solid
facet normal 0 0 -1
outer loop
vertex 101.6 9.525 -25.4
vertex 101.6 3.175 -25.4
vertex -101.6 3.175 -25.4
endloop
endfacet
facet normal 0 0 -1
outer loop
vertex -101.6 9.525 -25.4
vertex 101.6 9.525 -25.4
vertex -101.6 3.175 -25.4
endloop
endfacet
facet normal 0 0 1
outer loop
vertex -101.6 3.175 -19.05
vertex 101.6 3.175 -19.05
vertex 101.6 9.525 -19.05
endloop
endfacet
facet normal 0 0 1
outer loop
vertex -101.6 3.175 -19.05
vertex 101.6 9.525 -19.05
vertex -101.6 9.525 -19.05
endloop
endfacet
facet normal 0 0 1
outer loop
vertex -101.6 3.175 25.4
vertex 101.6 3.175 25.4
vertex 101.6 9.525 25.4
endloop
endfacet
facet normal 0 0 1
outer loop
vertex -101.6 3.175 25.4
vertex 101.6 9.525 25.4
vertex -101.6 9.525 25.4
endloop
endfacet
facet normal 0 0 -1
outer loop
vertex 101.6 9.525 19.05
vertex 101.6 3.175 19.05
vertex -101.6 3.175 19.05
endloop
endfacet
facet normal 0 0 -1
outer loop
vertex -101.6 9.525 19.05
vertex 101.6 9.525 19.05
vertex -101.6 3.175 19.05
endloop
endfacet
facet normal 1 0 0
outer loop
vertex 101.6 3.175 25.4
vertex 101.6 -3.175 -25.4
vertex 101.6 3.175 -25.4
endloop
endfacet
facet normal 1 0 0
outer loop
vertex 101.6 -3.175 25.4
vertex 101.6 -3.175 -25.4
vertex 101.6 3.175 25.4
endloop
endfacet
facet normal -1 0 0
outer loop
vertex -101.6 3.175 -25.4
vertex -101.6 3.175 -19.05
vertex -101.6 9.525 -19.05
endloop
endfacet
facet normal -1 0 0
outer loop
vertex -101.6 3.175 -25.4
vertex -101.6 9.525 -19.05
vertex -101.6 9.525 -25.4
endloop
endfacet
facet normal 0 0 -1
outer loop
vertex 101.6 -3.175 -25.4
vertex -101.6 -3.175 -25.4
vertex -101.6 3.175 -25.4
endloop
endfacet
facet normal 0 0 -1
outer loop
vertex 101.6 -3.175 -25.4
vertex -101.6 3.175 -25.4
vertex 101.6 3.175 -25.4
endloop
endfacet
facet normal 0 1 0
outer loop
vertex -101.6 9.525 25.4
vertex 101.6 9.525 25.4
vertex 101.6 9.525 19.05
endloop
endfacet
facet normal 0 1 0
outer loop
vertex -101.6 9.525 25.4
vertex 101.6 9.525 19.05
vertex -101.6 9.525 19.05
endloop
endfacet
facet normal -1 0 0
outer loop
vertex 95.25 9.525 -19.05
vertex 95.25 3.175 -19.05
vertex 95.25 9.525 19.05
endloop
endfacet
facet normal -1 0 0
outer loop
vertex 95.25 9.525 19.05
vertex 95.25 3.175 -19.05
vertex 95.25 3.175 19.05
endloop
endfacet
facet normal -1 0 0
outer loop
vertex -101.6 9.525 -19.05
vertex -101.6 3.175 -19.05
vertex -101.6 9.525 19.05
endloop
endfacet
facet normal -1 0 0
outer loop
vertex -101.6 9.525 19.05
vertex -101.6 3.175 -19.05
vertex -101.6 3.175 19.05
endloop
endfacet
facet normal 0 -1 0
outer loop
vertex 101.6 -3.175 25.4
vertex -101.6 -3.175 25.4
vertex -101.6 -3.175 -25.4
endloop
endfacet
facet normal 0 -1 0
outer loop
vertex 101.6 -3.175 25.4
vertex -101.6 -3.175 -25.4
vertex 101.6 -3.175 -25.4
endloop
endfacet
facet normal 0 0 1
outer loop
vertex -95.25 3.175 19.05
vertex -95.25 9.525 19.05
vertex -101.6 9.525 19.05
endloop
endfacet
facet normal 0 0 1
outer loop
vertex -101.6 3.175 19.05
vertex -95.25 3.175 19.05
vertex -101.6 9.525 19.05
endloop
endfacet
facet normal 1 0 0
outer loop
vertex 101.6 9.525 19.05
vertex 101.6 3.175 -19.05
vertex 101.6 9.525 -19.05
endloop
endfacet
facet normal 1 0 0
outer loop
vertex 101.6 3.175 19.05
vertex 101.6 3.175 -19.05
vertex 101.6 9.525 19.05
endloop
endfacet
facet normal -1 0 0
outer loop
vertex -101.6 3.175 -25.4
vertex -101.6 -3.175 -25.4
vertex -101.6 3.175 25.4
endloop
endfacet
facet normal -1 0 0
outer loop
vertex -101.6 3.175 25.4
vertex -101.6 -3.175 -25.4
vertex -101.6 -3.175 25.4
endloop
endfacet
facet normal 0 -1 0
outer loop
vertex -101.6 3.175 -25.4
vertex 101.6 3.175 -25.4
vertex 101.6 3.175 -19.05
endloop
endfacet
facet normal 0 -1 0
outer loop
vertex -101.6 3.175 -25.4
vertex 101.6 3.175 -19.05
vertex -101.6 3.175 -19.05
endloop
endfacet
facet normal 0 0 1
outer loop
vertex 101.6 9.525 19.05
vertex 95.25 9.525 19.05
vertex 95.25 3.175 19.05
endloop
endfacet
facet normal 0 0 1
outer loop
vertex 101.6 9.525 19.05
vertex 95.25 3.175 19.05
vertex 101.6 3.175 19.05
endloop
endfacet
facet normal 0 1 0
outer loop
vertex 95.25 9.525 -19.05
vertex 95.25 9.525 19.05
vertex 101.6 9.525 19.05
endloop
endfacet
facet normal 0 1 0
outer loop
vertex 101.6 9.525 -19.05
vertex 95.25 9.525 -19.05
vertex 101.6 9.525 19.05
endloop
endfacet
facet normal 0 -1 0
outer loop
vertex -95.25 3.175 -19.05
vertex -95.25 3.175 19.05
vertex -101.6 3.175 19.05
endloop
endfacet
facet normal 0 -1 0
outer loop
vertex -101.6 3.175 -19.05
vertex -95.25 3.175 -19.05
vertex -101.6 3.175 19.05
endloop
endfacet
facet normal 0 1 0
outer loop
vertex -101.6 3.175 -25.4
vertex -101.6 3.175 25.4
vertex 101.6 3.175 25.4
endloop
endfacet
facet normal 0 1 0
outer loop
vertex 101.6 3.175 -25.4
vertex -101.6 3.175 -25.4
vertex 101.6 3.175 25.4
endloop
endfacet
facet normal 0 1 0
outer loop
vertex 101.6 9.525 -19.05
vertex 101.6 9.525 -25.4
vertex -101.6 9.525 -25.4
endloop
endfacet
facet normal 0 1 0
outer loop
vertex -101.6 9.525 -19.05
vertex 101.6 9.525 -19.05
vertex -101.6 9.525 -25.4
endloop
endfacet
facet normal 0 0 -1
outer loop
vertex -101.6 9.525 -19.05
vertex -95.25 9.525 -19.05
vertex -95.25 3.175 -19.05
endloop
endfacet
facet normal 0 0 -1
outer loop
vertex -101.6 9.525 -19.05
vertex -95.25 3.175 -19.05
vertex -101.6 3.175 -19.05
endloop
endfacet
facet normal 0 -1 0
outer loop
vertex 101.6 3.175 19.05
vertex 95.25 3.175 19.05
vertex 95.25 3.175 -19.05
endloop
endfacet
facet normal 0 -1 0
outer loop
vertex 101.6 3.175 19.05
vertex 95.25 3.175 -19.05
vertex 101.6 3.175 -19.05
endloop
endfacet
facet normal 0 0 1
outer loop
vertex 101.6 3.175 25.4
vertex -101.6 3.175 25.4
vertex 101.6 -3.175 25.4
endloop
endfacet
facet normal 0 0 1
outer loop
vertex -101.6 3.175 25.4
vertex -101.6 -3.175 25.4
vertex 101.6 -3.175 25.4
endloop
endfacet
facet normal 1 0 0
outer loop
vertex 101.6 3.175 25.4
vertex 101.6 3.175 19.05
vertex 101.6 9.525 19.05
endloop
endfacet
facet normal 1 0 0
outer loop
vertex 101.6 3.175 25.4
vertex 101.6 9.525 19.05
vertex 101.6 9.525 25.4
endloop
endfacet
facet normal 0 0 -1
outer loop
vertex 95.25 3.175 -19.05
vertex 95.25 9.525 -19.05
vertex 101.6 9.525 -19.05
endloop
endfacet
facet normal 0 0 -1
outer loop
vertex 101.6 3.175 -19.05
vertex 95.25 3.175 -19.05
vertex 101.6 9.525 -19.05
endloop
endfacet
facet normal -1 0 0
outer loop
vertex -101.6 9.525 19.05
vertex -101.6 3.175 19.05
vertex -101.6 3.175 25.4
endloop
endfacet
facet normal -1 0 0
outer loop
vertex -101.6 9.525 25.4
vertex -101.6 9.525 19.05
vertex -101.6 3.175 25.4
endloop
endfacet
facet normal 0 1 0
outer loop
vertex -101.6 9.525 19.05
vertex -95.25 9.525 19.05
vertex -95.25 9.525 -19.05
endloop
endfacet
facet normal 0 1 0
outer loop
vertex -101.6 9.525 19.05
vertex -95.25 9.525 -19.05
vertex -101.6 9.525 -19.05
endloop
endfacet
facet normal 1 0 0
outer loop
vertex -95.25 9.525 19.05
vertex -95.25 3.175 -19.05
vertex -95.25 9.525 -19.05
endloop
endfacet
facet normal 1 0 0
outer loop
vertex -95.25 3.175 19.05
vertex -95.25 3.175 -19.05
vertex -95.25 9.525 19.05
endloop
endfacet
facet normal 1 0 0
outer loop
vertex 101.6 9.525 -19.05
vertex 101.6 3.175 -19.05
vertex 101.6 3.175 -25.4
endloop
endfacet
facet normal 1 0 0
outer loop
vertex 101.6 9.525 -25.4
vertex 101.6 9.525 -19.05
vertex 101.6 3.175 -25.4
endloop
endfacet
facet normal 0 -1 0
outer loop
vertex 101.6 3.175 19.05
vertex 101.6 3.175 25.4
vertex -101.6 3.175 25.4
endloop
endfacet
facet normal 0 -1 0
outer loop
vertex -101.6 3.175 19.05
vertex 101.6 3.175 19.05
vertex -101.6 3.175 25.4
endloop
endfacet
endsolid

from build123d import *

# Parameters (mm, degrees)
F0_W     = 203.2
F0_H     = 50.8
F1_DEPTH = 3.175
F2_W     = 203.2
F2_H     = 6.35
F3_DEPTH = 6.35
F5_W     = 6.35
F5_H     = 38.1
F6_DEPTH = 6.35


with BuildPart() as f1:
    # F0 (on Front) → F1 (new body, symmetric)
    with BuildSketch(Plane.XZ):
        Rectangle(F0_W, F0_H)
    extrude(amount=F1_DEPTH, both=True)


with BuildPart() as f3:
    # F2 (on face) → F3 (new body)
    with BuildSketch(Plane(origin=(0, 3.175, 0), x_dir=(-1, 0, 0), z_dir=(0, 1, 0))):
        with Locations((0, 22.225)):
            Rectangle(F2_W, F2_H)
    extrude(amount=F3_DEPTH)


with BuildPart() as f4_1:
    # F4: instance of F3
    add(f3.part.mirror(Plane.XY))


with BuildPart() as f6:
    # F5 (on face) → F6 (new body)
    with BuildSketch(Plane(origin=(0, 3.175, 0), x_dir=(-1, 0, 0), z_dir=(0, 1, 0))):
        with Locations((98.425, 0)):
            Rectangle(F5_W, F5_H)
    extrude(amount=F6_DEPTH)


with BuildPart() as f7_1:
    # F7: instance of F6
    add(f6.part.mirror(Plane.YZ))


solid = Compound([f1.part, f3.part, f4_1.part, f6.part, f7_1.part])
